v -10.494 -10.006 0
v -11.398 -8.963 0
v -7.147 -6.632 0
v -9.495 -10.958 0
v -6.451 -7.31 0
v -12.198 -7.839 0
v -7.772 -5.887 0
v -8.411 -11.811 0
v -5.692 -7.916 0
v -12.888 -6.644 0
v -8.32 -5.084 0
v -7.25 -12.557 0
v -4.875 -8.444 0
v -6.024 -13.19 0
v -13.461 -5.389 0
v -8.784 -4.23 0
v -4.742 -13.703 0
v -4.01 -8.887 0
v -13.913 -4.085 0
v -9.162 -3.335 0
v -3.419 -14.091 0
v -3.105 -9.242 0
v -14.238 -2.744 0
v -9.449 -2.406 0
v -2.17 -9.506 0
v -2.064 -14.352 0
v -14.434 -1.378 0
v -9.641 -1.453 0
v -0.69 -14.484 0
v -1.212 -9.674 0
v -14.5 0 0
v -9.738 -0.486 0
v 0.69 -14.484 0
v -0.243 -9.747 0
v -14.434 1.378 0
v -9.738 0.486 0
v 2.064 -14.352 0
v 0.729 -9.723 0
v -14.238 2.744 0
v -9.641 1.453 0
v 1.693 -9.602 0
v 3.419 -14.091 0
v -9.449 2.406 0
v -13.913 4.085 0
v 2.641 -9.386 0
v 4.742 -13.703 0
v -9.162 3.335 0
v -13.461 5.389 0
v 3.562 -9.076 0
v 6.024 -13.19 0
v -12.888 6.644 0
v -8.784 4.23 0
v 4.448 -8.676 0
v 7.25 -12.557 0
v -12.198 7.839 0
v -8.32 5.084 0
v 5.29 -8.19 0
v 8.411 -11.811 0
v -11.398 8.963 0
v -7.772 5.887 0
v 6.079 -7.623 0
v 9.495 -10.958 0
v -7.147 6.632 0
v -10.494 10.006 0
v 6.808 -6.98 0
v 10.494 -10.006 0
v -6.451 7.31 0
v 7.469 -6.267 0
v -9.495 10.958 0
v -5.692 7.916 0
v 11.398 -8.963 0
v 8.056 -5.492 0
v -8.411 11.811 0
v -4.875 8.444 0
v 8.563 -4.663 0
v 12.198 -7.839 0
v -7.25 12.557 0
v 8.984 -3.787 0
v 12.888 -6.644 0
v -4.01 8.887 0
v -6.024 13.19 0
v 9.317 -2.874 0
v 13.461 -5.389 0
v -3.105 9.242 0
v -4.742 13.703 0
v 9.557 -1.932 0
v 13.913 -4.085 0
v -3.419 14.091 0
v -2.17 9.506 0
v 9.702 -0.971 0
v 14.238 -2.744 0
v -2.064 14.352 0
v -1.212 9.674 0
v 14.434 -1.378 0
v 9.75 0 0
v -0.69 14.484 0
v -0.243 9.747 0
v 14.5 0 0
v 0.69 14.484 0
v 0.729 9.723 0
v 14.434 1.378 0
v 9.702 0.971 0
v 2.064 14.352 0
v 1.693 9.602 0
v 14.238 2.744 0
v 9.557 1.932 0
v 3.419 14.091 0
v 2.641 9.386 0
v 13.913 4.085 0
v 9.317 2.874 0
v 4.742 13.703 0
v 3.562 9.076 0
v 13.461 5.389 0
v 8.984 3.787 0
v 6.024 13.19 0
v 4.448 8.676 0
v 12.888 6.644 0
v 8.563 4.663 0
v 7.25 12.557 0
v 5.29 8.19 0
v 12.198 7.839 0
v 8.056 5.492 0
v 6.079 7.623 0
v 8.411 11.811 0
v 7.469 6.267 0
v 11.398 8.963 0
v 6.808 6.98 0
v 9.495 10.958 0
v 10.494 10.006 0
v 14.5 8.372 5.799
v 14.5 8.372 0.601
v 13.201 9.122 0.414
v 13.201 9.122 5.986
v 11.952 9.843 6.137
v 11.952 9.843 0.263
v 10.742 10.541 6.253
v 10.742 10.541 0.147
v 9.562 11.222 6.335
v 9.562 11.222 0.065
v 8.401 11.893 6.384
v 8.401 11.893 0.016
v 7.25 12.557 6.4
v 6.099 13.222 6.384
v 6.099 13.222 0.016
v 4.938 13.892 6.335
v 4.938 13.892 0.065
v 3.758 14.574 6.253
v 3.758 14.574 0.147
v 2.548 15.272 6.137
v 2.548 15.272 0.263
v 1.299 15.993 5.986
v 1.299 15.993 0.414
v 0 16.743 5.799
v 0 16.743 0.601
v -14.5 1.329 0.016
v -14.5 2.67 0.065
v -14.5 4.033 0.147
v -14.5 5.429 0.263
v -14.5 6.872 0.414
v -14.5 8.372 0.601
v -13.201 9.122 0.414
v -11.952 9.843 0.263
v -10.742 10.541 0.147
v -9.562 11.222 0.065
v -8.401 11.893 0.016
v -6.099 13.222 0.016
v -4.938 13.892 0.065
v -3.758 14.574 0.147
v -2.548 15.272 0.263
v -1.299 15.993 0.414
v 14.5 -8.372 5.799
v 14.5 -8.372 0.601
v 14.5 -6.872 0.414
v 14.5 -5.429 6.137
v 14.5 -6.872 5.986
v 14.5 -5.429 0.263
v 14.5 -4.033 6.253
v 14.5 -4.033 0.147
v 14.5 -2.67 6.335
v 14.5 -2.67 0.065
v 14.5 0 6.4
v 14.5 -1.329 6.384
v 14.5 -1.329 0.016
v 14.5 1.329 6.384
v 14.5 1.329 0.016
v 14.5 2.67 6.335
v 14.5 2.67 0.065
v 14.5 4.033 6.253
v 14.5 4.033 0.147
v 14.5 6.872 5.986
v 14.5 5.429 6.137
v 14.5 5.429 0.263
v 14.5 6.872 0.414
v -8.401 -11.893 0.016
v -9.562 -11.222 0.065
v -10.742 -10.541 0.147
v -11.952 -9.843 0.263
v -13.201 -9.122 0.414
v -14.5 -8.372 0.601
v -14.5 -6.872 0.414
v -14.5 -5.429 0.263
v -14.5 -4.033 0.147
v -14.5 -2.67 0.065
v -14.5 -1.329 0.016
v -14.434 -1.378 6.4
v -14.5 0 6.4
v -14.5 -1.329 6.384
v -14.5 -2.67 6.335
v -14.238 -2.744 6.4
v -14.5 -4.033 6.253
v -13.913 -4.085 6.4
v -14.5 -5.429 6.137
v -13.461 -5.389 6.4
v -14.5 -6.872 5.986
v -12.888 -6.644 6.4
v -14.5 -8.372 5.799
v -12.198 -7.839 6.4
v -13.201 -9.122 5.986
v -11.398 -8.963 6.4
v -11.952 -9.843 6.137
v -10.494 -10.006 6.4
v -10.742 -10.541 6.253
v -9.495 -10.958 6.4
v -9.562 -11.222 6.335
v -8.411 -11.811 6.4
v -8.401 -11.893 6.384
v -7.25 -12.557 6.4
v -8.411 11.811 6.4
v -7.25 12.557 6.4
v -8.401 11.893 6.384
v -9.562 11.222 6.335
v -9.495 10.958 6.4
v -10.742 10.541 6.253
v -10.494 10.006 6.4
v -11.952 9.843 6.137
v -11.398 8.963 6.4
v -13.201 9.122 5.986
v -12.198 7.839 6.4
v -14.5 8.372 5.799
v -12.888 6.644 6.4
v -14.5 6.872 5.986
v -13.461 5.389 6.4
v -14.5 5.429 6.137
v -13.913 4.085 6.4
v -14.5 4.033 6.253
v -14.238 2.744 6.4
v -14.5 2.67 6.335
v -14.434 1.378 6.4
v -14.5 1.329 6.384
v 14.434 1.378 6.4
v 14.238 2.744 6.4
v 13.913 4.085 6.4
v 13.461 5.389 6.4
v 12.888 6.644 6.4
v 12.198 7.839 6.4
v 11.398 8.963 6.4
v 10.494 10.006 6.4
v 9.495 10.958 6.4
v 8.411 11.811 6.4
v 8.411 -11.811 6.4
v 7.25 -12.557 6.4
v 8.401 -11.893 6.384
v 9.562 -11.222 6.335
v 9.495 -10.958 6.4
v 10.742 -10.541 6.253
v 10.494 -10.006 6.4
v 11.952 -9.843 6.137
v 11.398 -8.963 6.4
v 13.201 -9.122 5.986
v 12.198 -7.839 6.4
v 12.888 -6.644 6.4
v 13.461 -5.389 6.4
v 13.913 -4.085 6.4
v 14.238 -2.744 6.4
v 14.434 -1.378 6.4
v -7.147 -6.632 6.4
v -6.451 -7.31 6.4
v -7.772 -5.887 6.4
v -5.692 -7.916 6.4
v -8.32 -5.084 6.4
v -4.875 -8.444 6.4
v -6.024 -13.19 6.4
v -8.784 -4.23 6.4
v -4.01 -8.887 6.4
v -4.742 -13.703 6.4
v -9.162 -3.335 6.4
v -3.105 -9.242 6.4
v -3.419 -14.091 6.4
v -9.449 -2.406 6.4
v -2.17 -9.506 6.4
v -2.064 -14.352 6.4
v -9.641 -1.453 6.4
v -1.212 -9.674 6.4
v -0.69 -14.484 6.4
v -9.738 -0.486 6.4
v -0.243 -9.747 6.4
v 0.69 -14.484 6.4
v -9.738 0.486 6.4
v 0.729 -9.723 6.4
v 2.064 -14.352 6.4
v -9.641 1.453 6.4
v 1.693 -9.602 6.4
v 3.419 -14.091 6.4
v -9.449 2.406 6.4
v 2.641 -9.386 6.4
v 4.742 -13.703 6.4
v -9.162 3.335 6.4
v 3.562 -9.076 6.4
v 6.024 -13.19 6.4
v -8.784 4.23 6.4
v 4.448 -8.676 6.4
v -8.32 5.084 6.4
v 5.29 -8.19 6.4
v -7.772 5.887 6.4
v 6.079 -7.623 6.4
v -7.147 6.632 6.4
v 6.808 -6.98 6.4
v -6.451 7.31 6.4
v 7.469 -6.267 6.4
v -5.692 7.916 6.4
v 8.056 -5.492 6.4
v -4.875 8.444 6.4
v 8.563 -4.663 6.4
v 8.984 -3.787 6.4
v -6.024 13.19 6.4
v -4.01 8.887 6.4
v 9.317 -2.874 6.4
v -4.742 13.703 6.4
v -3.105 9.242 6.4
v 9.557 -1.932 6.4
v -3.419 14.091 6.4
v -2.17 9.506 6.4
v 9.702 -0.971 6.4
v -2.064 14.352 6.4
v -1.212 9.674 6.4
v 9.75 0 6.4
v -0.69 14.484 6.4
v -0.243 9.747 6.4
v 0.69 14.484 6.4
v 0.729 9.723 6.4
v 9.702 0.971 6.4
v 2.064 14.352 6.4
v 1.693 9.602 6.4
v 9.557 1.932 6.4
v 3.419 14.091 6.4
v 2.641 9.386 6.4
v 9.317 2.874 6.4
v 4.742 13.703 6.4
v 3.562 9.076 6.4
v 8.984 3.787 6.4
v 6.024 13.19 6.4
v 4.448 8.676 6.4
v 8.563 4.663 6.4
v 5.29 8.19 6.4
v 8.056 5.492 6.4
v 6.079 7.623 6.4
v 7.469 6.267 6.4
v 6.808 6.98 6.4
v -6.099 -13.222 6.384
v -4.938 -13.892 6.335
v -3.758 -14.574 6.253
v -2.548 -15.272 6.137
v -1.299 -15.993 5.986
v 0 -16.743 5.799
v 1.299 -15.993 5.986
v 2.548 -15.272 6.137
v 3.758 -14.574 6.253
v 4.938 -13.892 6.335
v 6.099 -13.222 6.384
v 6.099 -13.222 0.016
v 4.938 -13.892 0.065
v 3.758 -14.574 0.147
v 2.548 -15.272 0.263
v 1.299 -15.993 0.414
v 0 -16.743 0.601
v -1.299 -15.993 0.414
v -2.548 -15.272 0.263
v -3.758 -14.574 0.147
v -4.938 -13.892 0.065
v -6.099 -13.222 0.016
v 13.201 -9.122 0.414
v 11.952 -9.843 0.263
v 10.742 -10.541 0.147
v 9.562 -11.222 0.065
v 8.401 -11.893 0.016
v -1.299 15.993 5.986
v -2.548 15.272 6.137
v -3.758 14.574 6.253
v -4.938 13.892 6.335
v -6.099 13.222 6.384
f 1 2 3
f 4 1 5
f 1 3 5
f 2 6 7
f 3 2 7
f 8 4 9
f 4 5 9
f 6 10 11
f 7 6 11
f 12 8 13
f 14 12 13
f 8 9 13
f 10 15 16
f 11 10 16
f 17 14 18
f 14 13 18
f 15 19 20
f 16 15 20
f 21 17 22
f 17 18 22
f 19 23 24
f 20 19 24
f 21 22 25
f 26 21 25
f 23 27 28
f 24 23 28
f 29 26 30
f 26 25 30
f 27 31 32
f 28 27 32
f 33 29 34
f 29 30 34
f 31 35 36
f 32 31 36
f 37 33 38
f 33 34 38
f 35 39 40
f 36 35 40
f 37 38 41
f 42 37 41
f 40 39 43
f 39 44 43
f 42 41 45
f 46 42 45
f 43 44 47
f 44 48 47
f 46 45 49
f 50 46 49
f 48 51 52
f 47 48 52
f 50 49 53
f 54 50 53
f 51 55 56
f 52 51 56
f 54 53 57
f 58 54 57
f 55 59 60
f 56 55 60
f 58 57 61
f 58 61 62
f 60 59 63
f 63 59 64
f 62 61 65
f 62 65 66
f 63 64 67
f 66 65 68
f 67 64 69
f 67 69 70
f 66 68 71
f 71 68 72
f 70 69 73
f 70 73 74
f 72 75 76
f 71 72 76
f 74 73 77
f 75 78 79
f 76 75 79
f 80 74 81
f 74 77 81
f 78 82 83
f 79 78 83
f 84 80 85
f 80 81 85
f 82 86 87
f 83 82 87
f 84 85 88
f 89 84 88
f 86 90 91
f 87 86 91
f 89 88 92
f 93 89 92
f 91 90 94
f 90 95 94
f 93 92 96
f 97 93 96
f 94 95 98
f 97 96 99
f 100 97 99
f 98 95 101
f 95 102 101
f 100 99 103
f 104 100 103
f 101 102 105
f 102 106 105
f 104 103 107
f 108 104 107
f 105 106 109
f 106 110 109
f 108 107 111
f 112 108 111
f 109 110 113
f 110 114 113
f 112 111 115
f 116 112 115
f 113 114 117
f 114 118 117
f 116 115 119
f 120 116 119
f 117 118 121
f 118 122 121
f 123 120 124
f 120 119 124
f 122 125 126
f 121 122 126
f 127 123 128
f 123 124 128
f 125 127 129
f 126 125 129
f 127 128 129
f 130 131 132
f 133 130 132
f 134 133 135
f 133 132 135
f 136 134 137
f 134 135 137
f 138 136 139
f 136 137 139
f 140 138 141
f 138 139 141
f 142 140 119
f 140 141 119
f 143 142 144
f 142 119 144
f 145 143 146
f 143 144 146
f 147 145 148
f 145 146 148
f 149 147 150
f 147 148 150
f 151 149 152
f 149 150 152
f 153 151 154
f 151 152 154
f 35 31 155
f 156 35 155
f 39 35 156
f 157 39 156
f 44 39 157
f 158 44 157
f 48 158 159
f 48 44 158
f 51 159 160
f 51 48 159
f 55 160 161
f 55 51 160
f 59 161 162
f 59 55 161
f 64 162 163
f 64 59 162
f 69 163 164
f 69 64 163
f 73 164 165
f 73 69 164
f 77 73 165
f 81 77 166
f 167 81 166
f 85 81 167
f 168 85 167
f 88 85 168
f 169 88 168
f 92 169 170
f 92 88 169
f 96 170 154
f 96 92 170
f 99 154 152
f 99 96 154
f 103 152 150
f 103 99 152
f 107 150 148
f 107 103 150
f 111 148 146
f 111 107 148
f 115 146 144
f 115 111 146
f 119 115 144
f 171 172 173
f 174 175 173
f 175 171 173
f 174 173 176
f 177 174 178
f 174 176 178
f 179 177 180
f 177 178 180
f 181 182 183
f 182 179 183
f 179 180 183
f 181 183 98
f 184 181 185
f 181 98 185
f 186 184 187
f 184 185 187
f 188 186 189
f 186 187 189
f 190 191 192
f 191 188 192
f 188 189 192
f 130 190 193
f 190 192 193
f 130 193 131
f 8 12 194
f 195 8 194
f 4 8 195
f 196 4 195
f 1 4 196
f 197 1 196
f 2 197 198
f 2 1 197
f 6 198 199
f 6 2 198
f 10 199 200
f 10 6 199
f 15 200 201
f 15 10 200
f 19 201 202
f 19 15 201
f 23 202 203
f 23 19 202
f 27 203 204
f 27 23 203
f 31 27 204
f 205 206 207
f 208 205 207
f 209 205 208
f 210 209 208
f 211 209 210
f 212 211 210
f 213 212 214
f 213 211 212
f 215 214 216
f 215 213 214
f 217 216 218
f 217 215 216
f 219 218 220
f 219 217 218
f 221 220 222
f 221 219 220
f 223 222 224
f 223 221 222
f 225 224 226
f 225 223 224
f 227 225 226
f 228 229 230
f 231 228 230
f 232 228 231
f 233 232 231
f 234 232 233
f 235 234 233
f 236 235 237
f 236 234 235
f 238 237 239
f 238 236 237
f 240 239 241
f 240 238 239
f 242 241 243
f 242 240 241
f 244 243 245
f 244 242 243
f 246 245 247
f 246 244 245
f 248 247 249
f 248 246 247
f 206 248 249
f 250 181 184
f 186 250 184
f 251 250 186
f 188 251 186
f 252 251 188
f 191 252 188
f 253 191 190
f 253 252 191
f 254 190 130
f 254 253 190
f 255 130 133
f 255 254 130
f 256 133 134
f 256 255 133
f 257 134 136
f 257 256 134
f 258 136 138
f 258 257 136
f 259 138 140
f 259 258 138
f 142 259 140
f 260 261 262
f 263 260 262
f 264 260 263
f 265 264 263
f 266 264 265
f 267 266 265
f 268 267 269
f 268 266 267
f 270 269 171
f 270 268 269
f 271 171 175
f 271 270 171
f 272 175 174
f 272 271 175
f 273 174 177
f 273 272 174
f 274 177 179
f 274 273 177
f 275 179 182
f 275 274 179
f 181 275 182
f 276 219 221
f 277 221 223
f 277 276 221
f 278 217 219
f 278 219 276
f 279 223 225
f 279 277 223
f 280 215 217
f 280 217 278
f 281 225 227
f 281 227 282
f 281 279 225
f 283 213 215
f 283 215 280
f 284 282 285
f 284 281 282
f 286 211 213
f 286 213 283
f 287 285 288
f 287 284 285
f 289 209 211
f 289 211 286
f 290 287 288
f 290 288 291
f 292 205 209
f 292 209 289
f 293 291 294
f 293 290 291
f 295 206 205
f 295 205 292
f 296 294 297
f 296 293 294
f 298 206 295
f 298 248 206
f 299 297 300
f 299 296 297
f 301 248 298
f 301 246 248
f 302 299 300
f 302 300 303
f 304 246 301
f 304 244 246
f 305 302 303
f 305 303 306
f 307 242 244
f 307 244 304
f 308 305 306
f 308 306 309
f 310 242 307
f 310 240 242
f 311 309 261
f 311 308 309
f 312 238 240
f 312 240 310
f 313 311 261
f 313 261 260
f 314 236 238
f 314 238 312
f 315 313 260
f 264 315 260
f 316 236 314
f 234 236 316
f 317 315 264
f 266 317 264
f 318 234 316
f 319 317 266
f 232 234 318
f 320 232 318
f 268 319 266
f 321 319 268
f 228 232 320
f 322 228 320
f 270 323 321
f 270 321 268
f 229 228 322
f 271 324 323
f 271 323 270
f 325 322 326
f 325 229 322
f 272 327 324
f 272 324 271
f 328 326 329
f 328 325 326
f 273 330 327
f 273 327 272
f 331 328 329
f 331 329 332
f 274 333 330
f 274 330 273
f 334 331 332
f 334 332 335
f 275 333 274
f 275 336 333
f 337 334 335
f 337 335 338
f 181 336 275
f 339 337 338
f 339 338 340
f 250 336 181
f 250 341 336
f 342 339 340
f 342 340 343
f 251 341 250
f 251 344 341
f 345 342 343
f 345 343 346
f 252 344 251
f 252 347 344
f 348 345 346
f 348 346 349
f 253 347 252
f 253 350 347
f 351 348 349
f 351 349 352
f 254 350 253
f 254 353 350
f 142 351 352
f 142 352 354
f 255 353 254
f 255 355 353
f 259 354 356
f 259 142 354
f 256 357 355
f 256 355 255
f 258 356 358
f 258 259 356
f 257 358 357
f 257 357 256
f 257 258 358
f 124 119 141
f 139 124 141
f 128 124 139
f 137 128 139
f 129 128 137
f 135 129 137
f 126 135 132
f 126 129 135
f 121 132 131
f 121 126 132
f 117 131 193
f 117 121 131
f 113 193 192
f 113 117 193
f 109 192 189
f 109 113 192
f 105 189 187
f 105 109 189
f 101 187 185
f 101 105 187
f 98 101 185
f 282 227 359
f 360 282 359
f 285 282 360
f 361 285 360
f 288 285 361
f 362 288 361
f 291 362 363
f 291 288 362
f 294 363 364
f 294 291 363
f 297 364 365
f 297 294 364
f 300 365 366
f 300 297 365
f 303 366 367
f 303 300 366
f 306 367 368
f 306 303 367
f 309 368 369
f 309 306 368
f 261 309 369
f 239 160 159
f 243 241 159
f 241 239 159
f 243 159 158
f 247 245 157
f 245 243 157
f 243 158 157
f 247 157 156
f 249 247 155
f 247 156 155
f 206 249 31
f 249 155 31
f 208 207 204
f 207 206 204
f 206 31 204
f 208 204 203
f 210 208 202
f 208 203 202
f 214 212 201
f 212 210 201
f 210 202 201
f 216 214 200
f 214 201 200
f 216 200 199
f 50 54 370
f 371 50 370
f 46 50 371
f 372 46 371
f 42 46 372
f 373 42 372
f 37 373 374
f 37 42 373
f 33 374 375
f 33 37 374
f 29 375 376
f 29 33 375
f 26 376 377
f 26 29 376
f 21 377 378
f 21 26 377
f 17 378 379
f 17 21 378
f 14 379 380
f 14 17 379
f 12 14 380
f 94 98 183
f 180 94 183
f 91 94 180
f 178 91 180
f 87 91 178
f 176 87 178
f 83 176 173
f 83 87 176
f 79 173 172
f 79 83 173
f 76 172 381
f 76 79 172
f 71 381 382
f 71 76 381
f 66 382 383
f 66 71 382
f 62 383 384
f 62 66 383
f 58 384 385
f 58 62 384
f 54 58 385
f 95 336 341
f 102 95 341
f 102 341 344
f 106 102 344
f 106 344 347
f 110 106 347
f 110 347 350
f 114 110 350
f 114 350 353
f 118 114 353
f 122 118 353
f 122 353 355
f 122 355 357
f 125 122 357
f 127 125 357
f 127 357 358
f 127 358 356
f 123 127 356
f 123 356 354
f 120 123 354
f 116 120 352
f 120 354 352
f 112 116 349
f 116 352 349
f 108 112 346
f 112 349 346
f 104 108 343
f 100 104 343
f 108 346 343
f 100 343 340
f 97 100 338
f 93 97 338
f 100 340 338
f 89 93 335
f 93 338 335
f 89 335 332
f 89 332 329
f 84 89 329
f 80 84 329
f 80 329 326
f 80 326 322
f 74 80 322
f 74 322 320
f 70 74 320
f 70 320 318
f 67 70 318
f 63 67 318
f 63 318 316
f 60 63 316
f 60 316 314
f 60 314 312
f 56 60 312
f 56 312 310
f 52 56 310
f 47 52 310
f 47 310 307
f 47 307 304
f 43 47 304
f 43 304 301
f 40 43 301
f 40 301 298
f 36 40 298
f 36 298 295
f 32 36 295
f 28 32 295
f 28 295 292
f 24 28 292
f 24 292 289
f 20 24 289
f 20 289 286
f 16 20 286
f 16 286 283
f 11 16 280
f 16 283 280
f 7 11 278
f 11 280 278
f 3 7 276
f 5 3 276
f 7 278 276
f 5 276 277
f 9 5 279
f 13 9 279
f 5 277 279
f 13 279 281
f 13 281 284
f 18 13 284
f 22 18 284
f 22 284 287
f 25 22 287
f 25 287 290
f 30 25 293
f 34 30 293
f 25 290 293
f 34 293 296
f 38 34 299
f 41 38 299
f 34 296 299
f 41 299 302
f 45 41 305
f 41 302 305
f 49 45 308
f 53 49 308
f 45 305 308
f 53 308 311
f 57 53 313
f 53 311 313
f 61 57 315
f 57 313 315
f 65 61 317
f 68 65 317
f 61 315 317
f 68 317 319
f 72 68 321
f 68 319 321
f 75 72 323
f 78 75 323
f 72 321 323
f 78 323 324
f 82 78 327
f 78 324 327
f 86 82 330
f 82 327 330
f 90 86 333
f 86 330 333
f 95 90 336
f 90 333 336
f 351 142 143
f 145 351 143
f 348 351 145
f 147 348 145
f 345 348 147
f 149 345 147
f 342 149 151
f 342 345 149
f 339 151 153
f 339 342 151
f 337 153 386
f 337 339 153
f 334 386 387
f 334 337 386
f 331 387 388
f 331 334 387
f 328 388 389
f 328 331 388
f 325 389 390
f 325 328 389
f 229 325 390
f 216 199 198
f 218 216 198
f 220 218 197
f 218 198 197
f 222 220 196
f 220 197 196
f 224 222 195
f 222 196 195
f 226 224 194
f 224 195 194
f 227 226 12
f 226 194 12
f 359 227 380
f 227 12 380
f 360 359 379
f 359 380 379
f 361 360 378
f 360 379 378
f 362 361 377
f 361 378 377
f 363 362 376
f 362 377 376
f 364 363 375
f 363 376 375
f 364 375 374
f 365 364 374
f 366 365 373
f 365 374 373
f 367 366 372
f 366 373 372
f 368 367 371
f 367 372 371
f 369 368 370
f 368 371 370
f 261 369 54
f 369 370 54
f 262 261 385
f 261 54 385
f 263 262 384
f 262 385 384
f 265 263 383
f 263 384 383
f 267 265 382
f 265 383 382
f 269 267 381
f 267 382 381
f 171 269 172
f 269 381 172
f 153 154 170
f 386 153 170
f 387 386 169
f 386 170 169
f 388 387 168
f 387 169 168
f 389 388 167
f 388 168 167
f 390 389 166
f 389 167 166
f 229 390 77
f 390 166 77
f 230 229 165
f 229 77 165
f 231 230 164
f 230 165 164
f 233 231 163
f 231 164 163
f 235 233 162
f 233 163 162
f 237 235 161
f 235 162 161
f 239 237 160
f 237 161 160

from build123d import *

# Parameters (mm, degrees)
RESSALTO_EXTRUS_O1_DEPTH                 = 6.4
ESBO_O2_OUTSIDE_W                        = 151.914
ESBO_O2_OUTSIDE_H                        = 156.4
ESBO_O2_OUTSIDE_R                        = 14.5
CORTE_EXTRUS_O1_DEPTH                    = 15
CORTE_EXTRUS_O1_DRAFT                    = -75
ESBO_O3_OUTSIDE_W                        = 151.914
ESBO_O3_OUTSIDE_H                        = 156.4
ESBO_O3_OUTSIDE_R                        = 14.5
CORTE_EXTRUS_O2_DEPTH                    = 15
CORTE_EXTRUS_O2_DRAFT                    = -75
BROCA_DE_ROSQUEAR_PARA_TARRAXA_DE_M221_D = 19.5


with BuildPart() as part:
    # Esboço1 → Ressalto-extrusão1 (new body)
    with BuildSketch(Plane.XY):
        Polygon((0, 16.743157806), (-14.5, 8.371578903), (-14.5, -8.371578903), (0, -16.743157806), (14.5, -8.371578903), (14.5, 8.371578903), align=None)
    extrude(amount=RESSALTO_EXTRUS_O1_DEPTH)


with BuildPart() as corte_extrus_o1_tool:
    # Esboço2 outside → Corte-extrusão1 (with draft: the straight prism first)
    with BuildSketch(Plane.XY.offset(6.4)):
        Rectangle(ESBO_O2_OUTSIDE_W, ESBO_O2_OUTSIDE_H)
        Circle(ESBO_O2_OUTSIDE_R, mode=Mode.SUBTRACT)
    extrude(amount=-CORTE_EXTRUS_O1_DEPTH)
    # Corte-extrusão1: the draft: its side faces are tilted about the plane it starts from
    corte_extrus_o1_sides = [corte_extrus_o1_tool.faces().sort_by_distance(p)[0] for p in [
        (0, -78.2, -1.1),
        (75.957, 0, -1.1),
        (0, 78.2, -1.1),
        (-75.957, 0, -1.1),
        (-14.5, 0, -1.1),
    ]]
    draft(corte_extrus_o1_sides, Plane.XY.offset(6.4), CORTE_EXTRUS_O1_DRAFT)


with BuildPart() as part_1:
    add(part.part)

    # Corte-extrusão1: cut by corte_extrus_o1_tool
    add(corte_extrus_o1_tool.part, mode=Mode.SUBTRACT)


with BuildPart() as corte_extrus_o2_tool:
    # Esboço3 outside → Corte-extrusão2 (with draft: the straight prism first)
    with BuildSketch(Plane(origin=(0, 0, 0), x_dir=(-1, 0, 0), z_dir=(0, 0, -1))):
        Rectangle(ESBO_O3_OUTSIDE_W, ESBO_O3_OUTSIDE_H)
        Circle(ESBO_O3_OUTSIDE_R, mode=Mode.SUBTRACT)
    extrude(amount=-CORTE_EXTRUS_O2_DEPTH)
    # Corte-extrusão2: the draft: its side faces are tilted about the plane it starts from
    corte_extrus_o2_sides = [corte_extrus_o2_tool.faces().sort_by_distance(p)[0] for p in [
        (0, -78.2, 7.5),
        (-75.957, 0, 7.5),
        (0, 78.2, 7.5),
        (75.957, 0, 7.5),
        (14.5, 0, 7.5),
    ]]
    draft(corte_extrus_o2_sides, Plane(origin=(0, 0, 0), x_dir=(-1, 0, 0), z_dir=(0, 0, -1)), CORTE_EXTRUS_O2_DRAFT)


with BuildPart() as part_2:
    add(part_1.part)

    # Corte-extrusão2: cut by corte_extrus_o2_tool
    add(corte_extrus_o2_tool.part, mode=Mode.SUBTRACT)

    # Broca de rosquear para tarraxa de M221 (through all)
    with Locations(Plane(origin=(0, 0, 0), x_dir=(-1, 0, 0), z_dir=(0, 0, -1))):
        with Locations((0, 0)):
            Hole(BROCA_DE_ROSQUEAR_PARA_TARRAXA_DE_M221_D / 2)


solid = part_2.part
